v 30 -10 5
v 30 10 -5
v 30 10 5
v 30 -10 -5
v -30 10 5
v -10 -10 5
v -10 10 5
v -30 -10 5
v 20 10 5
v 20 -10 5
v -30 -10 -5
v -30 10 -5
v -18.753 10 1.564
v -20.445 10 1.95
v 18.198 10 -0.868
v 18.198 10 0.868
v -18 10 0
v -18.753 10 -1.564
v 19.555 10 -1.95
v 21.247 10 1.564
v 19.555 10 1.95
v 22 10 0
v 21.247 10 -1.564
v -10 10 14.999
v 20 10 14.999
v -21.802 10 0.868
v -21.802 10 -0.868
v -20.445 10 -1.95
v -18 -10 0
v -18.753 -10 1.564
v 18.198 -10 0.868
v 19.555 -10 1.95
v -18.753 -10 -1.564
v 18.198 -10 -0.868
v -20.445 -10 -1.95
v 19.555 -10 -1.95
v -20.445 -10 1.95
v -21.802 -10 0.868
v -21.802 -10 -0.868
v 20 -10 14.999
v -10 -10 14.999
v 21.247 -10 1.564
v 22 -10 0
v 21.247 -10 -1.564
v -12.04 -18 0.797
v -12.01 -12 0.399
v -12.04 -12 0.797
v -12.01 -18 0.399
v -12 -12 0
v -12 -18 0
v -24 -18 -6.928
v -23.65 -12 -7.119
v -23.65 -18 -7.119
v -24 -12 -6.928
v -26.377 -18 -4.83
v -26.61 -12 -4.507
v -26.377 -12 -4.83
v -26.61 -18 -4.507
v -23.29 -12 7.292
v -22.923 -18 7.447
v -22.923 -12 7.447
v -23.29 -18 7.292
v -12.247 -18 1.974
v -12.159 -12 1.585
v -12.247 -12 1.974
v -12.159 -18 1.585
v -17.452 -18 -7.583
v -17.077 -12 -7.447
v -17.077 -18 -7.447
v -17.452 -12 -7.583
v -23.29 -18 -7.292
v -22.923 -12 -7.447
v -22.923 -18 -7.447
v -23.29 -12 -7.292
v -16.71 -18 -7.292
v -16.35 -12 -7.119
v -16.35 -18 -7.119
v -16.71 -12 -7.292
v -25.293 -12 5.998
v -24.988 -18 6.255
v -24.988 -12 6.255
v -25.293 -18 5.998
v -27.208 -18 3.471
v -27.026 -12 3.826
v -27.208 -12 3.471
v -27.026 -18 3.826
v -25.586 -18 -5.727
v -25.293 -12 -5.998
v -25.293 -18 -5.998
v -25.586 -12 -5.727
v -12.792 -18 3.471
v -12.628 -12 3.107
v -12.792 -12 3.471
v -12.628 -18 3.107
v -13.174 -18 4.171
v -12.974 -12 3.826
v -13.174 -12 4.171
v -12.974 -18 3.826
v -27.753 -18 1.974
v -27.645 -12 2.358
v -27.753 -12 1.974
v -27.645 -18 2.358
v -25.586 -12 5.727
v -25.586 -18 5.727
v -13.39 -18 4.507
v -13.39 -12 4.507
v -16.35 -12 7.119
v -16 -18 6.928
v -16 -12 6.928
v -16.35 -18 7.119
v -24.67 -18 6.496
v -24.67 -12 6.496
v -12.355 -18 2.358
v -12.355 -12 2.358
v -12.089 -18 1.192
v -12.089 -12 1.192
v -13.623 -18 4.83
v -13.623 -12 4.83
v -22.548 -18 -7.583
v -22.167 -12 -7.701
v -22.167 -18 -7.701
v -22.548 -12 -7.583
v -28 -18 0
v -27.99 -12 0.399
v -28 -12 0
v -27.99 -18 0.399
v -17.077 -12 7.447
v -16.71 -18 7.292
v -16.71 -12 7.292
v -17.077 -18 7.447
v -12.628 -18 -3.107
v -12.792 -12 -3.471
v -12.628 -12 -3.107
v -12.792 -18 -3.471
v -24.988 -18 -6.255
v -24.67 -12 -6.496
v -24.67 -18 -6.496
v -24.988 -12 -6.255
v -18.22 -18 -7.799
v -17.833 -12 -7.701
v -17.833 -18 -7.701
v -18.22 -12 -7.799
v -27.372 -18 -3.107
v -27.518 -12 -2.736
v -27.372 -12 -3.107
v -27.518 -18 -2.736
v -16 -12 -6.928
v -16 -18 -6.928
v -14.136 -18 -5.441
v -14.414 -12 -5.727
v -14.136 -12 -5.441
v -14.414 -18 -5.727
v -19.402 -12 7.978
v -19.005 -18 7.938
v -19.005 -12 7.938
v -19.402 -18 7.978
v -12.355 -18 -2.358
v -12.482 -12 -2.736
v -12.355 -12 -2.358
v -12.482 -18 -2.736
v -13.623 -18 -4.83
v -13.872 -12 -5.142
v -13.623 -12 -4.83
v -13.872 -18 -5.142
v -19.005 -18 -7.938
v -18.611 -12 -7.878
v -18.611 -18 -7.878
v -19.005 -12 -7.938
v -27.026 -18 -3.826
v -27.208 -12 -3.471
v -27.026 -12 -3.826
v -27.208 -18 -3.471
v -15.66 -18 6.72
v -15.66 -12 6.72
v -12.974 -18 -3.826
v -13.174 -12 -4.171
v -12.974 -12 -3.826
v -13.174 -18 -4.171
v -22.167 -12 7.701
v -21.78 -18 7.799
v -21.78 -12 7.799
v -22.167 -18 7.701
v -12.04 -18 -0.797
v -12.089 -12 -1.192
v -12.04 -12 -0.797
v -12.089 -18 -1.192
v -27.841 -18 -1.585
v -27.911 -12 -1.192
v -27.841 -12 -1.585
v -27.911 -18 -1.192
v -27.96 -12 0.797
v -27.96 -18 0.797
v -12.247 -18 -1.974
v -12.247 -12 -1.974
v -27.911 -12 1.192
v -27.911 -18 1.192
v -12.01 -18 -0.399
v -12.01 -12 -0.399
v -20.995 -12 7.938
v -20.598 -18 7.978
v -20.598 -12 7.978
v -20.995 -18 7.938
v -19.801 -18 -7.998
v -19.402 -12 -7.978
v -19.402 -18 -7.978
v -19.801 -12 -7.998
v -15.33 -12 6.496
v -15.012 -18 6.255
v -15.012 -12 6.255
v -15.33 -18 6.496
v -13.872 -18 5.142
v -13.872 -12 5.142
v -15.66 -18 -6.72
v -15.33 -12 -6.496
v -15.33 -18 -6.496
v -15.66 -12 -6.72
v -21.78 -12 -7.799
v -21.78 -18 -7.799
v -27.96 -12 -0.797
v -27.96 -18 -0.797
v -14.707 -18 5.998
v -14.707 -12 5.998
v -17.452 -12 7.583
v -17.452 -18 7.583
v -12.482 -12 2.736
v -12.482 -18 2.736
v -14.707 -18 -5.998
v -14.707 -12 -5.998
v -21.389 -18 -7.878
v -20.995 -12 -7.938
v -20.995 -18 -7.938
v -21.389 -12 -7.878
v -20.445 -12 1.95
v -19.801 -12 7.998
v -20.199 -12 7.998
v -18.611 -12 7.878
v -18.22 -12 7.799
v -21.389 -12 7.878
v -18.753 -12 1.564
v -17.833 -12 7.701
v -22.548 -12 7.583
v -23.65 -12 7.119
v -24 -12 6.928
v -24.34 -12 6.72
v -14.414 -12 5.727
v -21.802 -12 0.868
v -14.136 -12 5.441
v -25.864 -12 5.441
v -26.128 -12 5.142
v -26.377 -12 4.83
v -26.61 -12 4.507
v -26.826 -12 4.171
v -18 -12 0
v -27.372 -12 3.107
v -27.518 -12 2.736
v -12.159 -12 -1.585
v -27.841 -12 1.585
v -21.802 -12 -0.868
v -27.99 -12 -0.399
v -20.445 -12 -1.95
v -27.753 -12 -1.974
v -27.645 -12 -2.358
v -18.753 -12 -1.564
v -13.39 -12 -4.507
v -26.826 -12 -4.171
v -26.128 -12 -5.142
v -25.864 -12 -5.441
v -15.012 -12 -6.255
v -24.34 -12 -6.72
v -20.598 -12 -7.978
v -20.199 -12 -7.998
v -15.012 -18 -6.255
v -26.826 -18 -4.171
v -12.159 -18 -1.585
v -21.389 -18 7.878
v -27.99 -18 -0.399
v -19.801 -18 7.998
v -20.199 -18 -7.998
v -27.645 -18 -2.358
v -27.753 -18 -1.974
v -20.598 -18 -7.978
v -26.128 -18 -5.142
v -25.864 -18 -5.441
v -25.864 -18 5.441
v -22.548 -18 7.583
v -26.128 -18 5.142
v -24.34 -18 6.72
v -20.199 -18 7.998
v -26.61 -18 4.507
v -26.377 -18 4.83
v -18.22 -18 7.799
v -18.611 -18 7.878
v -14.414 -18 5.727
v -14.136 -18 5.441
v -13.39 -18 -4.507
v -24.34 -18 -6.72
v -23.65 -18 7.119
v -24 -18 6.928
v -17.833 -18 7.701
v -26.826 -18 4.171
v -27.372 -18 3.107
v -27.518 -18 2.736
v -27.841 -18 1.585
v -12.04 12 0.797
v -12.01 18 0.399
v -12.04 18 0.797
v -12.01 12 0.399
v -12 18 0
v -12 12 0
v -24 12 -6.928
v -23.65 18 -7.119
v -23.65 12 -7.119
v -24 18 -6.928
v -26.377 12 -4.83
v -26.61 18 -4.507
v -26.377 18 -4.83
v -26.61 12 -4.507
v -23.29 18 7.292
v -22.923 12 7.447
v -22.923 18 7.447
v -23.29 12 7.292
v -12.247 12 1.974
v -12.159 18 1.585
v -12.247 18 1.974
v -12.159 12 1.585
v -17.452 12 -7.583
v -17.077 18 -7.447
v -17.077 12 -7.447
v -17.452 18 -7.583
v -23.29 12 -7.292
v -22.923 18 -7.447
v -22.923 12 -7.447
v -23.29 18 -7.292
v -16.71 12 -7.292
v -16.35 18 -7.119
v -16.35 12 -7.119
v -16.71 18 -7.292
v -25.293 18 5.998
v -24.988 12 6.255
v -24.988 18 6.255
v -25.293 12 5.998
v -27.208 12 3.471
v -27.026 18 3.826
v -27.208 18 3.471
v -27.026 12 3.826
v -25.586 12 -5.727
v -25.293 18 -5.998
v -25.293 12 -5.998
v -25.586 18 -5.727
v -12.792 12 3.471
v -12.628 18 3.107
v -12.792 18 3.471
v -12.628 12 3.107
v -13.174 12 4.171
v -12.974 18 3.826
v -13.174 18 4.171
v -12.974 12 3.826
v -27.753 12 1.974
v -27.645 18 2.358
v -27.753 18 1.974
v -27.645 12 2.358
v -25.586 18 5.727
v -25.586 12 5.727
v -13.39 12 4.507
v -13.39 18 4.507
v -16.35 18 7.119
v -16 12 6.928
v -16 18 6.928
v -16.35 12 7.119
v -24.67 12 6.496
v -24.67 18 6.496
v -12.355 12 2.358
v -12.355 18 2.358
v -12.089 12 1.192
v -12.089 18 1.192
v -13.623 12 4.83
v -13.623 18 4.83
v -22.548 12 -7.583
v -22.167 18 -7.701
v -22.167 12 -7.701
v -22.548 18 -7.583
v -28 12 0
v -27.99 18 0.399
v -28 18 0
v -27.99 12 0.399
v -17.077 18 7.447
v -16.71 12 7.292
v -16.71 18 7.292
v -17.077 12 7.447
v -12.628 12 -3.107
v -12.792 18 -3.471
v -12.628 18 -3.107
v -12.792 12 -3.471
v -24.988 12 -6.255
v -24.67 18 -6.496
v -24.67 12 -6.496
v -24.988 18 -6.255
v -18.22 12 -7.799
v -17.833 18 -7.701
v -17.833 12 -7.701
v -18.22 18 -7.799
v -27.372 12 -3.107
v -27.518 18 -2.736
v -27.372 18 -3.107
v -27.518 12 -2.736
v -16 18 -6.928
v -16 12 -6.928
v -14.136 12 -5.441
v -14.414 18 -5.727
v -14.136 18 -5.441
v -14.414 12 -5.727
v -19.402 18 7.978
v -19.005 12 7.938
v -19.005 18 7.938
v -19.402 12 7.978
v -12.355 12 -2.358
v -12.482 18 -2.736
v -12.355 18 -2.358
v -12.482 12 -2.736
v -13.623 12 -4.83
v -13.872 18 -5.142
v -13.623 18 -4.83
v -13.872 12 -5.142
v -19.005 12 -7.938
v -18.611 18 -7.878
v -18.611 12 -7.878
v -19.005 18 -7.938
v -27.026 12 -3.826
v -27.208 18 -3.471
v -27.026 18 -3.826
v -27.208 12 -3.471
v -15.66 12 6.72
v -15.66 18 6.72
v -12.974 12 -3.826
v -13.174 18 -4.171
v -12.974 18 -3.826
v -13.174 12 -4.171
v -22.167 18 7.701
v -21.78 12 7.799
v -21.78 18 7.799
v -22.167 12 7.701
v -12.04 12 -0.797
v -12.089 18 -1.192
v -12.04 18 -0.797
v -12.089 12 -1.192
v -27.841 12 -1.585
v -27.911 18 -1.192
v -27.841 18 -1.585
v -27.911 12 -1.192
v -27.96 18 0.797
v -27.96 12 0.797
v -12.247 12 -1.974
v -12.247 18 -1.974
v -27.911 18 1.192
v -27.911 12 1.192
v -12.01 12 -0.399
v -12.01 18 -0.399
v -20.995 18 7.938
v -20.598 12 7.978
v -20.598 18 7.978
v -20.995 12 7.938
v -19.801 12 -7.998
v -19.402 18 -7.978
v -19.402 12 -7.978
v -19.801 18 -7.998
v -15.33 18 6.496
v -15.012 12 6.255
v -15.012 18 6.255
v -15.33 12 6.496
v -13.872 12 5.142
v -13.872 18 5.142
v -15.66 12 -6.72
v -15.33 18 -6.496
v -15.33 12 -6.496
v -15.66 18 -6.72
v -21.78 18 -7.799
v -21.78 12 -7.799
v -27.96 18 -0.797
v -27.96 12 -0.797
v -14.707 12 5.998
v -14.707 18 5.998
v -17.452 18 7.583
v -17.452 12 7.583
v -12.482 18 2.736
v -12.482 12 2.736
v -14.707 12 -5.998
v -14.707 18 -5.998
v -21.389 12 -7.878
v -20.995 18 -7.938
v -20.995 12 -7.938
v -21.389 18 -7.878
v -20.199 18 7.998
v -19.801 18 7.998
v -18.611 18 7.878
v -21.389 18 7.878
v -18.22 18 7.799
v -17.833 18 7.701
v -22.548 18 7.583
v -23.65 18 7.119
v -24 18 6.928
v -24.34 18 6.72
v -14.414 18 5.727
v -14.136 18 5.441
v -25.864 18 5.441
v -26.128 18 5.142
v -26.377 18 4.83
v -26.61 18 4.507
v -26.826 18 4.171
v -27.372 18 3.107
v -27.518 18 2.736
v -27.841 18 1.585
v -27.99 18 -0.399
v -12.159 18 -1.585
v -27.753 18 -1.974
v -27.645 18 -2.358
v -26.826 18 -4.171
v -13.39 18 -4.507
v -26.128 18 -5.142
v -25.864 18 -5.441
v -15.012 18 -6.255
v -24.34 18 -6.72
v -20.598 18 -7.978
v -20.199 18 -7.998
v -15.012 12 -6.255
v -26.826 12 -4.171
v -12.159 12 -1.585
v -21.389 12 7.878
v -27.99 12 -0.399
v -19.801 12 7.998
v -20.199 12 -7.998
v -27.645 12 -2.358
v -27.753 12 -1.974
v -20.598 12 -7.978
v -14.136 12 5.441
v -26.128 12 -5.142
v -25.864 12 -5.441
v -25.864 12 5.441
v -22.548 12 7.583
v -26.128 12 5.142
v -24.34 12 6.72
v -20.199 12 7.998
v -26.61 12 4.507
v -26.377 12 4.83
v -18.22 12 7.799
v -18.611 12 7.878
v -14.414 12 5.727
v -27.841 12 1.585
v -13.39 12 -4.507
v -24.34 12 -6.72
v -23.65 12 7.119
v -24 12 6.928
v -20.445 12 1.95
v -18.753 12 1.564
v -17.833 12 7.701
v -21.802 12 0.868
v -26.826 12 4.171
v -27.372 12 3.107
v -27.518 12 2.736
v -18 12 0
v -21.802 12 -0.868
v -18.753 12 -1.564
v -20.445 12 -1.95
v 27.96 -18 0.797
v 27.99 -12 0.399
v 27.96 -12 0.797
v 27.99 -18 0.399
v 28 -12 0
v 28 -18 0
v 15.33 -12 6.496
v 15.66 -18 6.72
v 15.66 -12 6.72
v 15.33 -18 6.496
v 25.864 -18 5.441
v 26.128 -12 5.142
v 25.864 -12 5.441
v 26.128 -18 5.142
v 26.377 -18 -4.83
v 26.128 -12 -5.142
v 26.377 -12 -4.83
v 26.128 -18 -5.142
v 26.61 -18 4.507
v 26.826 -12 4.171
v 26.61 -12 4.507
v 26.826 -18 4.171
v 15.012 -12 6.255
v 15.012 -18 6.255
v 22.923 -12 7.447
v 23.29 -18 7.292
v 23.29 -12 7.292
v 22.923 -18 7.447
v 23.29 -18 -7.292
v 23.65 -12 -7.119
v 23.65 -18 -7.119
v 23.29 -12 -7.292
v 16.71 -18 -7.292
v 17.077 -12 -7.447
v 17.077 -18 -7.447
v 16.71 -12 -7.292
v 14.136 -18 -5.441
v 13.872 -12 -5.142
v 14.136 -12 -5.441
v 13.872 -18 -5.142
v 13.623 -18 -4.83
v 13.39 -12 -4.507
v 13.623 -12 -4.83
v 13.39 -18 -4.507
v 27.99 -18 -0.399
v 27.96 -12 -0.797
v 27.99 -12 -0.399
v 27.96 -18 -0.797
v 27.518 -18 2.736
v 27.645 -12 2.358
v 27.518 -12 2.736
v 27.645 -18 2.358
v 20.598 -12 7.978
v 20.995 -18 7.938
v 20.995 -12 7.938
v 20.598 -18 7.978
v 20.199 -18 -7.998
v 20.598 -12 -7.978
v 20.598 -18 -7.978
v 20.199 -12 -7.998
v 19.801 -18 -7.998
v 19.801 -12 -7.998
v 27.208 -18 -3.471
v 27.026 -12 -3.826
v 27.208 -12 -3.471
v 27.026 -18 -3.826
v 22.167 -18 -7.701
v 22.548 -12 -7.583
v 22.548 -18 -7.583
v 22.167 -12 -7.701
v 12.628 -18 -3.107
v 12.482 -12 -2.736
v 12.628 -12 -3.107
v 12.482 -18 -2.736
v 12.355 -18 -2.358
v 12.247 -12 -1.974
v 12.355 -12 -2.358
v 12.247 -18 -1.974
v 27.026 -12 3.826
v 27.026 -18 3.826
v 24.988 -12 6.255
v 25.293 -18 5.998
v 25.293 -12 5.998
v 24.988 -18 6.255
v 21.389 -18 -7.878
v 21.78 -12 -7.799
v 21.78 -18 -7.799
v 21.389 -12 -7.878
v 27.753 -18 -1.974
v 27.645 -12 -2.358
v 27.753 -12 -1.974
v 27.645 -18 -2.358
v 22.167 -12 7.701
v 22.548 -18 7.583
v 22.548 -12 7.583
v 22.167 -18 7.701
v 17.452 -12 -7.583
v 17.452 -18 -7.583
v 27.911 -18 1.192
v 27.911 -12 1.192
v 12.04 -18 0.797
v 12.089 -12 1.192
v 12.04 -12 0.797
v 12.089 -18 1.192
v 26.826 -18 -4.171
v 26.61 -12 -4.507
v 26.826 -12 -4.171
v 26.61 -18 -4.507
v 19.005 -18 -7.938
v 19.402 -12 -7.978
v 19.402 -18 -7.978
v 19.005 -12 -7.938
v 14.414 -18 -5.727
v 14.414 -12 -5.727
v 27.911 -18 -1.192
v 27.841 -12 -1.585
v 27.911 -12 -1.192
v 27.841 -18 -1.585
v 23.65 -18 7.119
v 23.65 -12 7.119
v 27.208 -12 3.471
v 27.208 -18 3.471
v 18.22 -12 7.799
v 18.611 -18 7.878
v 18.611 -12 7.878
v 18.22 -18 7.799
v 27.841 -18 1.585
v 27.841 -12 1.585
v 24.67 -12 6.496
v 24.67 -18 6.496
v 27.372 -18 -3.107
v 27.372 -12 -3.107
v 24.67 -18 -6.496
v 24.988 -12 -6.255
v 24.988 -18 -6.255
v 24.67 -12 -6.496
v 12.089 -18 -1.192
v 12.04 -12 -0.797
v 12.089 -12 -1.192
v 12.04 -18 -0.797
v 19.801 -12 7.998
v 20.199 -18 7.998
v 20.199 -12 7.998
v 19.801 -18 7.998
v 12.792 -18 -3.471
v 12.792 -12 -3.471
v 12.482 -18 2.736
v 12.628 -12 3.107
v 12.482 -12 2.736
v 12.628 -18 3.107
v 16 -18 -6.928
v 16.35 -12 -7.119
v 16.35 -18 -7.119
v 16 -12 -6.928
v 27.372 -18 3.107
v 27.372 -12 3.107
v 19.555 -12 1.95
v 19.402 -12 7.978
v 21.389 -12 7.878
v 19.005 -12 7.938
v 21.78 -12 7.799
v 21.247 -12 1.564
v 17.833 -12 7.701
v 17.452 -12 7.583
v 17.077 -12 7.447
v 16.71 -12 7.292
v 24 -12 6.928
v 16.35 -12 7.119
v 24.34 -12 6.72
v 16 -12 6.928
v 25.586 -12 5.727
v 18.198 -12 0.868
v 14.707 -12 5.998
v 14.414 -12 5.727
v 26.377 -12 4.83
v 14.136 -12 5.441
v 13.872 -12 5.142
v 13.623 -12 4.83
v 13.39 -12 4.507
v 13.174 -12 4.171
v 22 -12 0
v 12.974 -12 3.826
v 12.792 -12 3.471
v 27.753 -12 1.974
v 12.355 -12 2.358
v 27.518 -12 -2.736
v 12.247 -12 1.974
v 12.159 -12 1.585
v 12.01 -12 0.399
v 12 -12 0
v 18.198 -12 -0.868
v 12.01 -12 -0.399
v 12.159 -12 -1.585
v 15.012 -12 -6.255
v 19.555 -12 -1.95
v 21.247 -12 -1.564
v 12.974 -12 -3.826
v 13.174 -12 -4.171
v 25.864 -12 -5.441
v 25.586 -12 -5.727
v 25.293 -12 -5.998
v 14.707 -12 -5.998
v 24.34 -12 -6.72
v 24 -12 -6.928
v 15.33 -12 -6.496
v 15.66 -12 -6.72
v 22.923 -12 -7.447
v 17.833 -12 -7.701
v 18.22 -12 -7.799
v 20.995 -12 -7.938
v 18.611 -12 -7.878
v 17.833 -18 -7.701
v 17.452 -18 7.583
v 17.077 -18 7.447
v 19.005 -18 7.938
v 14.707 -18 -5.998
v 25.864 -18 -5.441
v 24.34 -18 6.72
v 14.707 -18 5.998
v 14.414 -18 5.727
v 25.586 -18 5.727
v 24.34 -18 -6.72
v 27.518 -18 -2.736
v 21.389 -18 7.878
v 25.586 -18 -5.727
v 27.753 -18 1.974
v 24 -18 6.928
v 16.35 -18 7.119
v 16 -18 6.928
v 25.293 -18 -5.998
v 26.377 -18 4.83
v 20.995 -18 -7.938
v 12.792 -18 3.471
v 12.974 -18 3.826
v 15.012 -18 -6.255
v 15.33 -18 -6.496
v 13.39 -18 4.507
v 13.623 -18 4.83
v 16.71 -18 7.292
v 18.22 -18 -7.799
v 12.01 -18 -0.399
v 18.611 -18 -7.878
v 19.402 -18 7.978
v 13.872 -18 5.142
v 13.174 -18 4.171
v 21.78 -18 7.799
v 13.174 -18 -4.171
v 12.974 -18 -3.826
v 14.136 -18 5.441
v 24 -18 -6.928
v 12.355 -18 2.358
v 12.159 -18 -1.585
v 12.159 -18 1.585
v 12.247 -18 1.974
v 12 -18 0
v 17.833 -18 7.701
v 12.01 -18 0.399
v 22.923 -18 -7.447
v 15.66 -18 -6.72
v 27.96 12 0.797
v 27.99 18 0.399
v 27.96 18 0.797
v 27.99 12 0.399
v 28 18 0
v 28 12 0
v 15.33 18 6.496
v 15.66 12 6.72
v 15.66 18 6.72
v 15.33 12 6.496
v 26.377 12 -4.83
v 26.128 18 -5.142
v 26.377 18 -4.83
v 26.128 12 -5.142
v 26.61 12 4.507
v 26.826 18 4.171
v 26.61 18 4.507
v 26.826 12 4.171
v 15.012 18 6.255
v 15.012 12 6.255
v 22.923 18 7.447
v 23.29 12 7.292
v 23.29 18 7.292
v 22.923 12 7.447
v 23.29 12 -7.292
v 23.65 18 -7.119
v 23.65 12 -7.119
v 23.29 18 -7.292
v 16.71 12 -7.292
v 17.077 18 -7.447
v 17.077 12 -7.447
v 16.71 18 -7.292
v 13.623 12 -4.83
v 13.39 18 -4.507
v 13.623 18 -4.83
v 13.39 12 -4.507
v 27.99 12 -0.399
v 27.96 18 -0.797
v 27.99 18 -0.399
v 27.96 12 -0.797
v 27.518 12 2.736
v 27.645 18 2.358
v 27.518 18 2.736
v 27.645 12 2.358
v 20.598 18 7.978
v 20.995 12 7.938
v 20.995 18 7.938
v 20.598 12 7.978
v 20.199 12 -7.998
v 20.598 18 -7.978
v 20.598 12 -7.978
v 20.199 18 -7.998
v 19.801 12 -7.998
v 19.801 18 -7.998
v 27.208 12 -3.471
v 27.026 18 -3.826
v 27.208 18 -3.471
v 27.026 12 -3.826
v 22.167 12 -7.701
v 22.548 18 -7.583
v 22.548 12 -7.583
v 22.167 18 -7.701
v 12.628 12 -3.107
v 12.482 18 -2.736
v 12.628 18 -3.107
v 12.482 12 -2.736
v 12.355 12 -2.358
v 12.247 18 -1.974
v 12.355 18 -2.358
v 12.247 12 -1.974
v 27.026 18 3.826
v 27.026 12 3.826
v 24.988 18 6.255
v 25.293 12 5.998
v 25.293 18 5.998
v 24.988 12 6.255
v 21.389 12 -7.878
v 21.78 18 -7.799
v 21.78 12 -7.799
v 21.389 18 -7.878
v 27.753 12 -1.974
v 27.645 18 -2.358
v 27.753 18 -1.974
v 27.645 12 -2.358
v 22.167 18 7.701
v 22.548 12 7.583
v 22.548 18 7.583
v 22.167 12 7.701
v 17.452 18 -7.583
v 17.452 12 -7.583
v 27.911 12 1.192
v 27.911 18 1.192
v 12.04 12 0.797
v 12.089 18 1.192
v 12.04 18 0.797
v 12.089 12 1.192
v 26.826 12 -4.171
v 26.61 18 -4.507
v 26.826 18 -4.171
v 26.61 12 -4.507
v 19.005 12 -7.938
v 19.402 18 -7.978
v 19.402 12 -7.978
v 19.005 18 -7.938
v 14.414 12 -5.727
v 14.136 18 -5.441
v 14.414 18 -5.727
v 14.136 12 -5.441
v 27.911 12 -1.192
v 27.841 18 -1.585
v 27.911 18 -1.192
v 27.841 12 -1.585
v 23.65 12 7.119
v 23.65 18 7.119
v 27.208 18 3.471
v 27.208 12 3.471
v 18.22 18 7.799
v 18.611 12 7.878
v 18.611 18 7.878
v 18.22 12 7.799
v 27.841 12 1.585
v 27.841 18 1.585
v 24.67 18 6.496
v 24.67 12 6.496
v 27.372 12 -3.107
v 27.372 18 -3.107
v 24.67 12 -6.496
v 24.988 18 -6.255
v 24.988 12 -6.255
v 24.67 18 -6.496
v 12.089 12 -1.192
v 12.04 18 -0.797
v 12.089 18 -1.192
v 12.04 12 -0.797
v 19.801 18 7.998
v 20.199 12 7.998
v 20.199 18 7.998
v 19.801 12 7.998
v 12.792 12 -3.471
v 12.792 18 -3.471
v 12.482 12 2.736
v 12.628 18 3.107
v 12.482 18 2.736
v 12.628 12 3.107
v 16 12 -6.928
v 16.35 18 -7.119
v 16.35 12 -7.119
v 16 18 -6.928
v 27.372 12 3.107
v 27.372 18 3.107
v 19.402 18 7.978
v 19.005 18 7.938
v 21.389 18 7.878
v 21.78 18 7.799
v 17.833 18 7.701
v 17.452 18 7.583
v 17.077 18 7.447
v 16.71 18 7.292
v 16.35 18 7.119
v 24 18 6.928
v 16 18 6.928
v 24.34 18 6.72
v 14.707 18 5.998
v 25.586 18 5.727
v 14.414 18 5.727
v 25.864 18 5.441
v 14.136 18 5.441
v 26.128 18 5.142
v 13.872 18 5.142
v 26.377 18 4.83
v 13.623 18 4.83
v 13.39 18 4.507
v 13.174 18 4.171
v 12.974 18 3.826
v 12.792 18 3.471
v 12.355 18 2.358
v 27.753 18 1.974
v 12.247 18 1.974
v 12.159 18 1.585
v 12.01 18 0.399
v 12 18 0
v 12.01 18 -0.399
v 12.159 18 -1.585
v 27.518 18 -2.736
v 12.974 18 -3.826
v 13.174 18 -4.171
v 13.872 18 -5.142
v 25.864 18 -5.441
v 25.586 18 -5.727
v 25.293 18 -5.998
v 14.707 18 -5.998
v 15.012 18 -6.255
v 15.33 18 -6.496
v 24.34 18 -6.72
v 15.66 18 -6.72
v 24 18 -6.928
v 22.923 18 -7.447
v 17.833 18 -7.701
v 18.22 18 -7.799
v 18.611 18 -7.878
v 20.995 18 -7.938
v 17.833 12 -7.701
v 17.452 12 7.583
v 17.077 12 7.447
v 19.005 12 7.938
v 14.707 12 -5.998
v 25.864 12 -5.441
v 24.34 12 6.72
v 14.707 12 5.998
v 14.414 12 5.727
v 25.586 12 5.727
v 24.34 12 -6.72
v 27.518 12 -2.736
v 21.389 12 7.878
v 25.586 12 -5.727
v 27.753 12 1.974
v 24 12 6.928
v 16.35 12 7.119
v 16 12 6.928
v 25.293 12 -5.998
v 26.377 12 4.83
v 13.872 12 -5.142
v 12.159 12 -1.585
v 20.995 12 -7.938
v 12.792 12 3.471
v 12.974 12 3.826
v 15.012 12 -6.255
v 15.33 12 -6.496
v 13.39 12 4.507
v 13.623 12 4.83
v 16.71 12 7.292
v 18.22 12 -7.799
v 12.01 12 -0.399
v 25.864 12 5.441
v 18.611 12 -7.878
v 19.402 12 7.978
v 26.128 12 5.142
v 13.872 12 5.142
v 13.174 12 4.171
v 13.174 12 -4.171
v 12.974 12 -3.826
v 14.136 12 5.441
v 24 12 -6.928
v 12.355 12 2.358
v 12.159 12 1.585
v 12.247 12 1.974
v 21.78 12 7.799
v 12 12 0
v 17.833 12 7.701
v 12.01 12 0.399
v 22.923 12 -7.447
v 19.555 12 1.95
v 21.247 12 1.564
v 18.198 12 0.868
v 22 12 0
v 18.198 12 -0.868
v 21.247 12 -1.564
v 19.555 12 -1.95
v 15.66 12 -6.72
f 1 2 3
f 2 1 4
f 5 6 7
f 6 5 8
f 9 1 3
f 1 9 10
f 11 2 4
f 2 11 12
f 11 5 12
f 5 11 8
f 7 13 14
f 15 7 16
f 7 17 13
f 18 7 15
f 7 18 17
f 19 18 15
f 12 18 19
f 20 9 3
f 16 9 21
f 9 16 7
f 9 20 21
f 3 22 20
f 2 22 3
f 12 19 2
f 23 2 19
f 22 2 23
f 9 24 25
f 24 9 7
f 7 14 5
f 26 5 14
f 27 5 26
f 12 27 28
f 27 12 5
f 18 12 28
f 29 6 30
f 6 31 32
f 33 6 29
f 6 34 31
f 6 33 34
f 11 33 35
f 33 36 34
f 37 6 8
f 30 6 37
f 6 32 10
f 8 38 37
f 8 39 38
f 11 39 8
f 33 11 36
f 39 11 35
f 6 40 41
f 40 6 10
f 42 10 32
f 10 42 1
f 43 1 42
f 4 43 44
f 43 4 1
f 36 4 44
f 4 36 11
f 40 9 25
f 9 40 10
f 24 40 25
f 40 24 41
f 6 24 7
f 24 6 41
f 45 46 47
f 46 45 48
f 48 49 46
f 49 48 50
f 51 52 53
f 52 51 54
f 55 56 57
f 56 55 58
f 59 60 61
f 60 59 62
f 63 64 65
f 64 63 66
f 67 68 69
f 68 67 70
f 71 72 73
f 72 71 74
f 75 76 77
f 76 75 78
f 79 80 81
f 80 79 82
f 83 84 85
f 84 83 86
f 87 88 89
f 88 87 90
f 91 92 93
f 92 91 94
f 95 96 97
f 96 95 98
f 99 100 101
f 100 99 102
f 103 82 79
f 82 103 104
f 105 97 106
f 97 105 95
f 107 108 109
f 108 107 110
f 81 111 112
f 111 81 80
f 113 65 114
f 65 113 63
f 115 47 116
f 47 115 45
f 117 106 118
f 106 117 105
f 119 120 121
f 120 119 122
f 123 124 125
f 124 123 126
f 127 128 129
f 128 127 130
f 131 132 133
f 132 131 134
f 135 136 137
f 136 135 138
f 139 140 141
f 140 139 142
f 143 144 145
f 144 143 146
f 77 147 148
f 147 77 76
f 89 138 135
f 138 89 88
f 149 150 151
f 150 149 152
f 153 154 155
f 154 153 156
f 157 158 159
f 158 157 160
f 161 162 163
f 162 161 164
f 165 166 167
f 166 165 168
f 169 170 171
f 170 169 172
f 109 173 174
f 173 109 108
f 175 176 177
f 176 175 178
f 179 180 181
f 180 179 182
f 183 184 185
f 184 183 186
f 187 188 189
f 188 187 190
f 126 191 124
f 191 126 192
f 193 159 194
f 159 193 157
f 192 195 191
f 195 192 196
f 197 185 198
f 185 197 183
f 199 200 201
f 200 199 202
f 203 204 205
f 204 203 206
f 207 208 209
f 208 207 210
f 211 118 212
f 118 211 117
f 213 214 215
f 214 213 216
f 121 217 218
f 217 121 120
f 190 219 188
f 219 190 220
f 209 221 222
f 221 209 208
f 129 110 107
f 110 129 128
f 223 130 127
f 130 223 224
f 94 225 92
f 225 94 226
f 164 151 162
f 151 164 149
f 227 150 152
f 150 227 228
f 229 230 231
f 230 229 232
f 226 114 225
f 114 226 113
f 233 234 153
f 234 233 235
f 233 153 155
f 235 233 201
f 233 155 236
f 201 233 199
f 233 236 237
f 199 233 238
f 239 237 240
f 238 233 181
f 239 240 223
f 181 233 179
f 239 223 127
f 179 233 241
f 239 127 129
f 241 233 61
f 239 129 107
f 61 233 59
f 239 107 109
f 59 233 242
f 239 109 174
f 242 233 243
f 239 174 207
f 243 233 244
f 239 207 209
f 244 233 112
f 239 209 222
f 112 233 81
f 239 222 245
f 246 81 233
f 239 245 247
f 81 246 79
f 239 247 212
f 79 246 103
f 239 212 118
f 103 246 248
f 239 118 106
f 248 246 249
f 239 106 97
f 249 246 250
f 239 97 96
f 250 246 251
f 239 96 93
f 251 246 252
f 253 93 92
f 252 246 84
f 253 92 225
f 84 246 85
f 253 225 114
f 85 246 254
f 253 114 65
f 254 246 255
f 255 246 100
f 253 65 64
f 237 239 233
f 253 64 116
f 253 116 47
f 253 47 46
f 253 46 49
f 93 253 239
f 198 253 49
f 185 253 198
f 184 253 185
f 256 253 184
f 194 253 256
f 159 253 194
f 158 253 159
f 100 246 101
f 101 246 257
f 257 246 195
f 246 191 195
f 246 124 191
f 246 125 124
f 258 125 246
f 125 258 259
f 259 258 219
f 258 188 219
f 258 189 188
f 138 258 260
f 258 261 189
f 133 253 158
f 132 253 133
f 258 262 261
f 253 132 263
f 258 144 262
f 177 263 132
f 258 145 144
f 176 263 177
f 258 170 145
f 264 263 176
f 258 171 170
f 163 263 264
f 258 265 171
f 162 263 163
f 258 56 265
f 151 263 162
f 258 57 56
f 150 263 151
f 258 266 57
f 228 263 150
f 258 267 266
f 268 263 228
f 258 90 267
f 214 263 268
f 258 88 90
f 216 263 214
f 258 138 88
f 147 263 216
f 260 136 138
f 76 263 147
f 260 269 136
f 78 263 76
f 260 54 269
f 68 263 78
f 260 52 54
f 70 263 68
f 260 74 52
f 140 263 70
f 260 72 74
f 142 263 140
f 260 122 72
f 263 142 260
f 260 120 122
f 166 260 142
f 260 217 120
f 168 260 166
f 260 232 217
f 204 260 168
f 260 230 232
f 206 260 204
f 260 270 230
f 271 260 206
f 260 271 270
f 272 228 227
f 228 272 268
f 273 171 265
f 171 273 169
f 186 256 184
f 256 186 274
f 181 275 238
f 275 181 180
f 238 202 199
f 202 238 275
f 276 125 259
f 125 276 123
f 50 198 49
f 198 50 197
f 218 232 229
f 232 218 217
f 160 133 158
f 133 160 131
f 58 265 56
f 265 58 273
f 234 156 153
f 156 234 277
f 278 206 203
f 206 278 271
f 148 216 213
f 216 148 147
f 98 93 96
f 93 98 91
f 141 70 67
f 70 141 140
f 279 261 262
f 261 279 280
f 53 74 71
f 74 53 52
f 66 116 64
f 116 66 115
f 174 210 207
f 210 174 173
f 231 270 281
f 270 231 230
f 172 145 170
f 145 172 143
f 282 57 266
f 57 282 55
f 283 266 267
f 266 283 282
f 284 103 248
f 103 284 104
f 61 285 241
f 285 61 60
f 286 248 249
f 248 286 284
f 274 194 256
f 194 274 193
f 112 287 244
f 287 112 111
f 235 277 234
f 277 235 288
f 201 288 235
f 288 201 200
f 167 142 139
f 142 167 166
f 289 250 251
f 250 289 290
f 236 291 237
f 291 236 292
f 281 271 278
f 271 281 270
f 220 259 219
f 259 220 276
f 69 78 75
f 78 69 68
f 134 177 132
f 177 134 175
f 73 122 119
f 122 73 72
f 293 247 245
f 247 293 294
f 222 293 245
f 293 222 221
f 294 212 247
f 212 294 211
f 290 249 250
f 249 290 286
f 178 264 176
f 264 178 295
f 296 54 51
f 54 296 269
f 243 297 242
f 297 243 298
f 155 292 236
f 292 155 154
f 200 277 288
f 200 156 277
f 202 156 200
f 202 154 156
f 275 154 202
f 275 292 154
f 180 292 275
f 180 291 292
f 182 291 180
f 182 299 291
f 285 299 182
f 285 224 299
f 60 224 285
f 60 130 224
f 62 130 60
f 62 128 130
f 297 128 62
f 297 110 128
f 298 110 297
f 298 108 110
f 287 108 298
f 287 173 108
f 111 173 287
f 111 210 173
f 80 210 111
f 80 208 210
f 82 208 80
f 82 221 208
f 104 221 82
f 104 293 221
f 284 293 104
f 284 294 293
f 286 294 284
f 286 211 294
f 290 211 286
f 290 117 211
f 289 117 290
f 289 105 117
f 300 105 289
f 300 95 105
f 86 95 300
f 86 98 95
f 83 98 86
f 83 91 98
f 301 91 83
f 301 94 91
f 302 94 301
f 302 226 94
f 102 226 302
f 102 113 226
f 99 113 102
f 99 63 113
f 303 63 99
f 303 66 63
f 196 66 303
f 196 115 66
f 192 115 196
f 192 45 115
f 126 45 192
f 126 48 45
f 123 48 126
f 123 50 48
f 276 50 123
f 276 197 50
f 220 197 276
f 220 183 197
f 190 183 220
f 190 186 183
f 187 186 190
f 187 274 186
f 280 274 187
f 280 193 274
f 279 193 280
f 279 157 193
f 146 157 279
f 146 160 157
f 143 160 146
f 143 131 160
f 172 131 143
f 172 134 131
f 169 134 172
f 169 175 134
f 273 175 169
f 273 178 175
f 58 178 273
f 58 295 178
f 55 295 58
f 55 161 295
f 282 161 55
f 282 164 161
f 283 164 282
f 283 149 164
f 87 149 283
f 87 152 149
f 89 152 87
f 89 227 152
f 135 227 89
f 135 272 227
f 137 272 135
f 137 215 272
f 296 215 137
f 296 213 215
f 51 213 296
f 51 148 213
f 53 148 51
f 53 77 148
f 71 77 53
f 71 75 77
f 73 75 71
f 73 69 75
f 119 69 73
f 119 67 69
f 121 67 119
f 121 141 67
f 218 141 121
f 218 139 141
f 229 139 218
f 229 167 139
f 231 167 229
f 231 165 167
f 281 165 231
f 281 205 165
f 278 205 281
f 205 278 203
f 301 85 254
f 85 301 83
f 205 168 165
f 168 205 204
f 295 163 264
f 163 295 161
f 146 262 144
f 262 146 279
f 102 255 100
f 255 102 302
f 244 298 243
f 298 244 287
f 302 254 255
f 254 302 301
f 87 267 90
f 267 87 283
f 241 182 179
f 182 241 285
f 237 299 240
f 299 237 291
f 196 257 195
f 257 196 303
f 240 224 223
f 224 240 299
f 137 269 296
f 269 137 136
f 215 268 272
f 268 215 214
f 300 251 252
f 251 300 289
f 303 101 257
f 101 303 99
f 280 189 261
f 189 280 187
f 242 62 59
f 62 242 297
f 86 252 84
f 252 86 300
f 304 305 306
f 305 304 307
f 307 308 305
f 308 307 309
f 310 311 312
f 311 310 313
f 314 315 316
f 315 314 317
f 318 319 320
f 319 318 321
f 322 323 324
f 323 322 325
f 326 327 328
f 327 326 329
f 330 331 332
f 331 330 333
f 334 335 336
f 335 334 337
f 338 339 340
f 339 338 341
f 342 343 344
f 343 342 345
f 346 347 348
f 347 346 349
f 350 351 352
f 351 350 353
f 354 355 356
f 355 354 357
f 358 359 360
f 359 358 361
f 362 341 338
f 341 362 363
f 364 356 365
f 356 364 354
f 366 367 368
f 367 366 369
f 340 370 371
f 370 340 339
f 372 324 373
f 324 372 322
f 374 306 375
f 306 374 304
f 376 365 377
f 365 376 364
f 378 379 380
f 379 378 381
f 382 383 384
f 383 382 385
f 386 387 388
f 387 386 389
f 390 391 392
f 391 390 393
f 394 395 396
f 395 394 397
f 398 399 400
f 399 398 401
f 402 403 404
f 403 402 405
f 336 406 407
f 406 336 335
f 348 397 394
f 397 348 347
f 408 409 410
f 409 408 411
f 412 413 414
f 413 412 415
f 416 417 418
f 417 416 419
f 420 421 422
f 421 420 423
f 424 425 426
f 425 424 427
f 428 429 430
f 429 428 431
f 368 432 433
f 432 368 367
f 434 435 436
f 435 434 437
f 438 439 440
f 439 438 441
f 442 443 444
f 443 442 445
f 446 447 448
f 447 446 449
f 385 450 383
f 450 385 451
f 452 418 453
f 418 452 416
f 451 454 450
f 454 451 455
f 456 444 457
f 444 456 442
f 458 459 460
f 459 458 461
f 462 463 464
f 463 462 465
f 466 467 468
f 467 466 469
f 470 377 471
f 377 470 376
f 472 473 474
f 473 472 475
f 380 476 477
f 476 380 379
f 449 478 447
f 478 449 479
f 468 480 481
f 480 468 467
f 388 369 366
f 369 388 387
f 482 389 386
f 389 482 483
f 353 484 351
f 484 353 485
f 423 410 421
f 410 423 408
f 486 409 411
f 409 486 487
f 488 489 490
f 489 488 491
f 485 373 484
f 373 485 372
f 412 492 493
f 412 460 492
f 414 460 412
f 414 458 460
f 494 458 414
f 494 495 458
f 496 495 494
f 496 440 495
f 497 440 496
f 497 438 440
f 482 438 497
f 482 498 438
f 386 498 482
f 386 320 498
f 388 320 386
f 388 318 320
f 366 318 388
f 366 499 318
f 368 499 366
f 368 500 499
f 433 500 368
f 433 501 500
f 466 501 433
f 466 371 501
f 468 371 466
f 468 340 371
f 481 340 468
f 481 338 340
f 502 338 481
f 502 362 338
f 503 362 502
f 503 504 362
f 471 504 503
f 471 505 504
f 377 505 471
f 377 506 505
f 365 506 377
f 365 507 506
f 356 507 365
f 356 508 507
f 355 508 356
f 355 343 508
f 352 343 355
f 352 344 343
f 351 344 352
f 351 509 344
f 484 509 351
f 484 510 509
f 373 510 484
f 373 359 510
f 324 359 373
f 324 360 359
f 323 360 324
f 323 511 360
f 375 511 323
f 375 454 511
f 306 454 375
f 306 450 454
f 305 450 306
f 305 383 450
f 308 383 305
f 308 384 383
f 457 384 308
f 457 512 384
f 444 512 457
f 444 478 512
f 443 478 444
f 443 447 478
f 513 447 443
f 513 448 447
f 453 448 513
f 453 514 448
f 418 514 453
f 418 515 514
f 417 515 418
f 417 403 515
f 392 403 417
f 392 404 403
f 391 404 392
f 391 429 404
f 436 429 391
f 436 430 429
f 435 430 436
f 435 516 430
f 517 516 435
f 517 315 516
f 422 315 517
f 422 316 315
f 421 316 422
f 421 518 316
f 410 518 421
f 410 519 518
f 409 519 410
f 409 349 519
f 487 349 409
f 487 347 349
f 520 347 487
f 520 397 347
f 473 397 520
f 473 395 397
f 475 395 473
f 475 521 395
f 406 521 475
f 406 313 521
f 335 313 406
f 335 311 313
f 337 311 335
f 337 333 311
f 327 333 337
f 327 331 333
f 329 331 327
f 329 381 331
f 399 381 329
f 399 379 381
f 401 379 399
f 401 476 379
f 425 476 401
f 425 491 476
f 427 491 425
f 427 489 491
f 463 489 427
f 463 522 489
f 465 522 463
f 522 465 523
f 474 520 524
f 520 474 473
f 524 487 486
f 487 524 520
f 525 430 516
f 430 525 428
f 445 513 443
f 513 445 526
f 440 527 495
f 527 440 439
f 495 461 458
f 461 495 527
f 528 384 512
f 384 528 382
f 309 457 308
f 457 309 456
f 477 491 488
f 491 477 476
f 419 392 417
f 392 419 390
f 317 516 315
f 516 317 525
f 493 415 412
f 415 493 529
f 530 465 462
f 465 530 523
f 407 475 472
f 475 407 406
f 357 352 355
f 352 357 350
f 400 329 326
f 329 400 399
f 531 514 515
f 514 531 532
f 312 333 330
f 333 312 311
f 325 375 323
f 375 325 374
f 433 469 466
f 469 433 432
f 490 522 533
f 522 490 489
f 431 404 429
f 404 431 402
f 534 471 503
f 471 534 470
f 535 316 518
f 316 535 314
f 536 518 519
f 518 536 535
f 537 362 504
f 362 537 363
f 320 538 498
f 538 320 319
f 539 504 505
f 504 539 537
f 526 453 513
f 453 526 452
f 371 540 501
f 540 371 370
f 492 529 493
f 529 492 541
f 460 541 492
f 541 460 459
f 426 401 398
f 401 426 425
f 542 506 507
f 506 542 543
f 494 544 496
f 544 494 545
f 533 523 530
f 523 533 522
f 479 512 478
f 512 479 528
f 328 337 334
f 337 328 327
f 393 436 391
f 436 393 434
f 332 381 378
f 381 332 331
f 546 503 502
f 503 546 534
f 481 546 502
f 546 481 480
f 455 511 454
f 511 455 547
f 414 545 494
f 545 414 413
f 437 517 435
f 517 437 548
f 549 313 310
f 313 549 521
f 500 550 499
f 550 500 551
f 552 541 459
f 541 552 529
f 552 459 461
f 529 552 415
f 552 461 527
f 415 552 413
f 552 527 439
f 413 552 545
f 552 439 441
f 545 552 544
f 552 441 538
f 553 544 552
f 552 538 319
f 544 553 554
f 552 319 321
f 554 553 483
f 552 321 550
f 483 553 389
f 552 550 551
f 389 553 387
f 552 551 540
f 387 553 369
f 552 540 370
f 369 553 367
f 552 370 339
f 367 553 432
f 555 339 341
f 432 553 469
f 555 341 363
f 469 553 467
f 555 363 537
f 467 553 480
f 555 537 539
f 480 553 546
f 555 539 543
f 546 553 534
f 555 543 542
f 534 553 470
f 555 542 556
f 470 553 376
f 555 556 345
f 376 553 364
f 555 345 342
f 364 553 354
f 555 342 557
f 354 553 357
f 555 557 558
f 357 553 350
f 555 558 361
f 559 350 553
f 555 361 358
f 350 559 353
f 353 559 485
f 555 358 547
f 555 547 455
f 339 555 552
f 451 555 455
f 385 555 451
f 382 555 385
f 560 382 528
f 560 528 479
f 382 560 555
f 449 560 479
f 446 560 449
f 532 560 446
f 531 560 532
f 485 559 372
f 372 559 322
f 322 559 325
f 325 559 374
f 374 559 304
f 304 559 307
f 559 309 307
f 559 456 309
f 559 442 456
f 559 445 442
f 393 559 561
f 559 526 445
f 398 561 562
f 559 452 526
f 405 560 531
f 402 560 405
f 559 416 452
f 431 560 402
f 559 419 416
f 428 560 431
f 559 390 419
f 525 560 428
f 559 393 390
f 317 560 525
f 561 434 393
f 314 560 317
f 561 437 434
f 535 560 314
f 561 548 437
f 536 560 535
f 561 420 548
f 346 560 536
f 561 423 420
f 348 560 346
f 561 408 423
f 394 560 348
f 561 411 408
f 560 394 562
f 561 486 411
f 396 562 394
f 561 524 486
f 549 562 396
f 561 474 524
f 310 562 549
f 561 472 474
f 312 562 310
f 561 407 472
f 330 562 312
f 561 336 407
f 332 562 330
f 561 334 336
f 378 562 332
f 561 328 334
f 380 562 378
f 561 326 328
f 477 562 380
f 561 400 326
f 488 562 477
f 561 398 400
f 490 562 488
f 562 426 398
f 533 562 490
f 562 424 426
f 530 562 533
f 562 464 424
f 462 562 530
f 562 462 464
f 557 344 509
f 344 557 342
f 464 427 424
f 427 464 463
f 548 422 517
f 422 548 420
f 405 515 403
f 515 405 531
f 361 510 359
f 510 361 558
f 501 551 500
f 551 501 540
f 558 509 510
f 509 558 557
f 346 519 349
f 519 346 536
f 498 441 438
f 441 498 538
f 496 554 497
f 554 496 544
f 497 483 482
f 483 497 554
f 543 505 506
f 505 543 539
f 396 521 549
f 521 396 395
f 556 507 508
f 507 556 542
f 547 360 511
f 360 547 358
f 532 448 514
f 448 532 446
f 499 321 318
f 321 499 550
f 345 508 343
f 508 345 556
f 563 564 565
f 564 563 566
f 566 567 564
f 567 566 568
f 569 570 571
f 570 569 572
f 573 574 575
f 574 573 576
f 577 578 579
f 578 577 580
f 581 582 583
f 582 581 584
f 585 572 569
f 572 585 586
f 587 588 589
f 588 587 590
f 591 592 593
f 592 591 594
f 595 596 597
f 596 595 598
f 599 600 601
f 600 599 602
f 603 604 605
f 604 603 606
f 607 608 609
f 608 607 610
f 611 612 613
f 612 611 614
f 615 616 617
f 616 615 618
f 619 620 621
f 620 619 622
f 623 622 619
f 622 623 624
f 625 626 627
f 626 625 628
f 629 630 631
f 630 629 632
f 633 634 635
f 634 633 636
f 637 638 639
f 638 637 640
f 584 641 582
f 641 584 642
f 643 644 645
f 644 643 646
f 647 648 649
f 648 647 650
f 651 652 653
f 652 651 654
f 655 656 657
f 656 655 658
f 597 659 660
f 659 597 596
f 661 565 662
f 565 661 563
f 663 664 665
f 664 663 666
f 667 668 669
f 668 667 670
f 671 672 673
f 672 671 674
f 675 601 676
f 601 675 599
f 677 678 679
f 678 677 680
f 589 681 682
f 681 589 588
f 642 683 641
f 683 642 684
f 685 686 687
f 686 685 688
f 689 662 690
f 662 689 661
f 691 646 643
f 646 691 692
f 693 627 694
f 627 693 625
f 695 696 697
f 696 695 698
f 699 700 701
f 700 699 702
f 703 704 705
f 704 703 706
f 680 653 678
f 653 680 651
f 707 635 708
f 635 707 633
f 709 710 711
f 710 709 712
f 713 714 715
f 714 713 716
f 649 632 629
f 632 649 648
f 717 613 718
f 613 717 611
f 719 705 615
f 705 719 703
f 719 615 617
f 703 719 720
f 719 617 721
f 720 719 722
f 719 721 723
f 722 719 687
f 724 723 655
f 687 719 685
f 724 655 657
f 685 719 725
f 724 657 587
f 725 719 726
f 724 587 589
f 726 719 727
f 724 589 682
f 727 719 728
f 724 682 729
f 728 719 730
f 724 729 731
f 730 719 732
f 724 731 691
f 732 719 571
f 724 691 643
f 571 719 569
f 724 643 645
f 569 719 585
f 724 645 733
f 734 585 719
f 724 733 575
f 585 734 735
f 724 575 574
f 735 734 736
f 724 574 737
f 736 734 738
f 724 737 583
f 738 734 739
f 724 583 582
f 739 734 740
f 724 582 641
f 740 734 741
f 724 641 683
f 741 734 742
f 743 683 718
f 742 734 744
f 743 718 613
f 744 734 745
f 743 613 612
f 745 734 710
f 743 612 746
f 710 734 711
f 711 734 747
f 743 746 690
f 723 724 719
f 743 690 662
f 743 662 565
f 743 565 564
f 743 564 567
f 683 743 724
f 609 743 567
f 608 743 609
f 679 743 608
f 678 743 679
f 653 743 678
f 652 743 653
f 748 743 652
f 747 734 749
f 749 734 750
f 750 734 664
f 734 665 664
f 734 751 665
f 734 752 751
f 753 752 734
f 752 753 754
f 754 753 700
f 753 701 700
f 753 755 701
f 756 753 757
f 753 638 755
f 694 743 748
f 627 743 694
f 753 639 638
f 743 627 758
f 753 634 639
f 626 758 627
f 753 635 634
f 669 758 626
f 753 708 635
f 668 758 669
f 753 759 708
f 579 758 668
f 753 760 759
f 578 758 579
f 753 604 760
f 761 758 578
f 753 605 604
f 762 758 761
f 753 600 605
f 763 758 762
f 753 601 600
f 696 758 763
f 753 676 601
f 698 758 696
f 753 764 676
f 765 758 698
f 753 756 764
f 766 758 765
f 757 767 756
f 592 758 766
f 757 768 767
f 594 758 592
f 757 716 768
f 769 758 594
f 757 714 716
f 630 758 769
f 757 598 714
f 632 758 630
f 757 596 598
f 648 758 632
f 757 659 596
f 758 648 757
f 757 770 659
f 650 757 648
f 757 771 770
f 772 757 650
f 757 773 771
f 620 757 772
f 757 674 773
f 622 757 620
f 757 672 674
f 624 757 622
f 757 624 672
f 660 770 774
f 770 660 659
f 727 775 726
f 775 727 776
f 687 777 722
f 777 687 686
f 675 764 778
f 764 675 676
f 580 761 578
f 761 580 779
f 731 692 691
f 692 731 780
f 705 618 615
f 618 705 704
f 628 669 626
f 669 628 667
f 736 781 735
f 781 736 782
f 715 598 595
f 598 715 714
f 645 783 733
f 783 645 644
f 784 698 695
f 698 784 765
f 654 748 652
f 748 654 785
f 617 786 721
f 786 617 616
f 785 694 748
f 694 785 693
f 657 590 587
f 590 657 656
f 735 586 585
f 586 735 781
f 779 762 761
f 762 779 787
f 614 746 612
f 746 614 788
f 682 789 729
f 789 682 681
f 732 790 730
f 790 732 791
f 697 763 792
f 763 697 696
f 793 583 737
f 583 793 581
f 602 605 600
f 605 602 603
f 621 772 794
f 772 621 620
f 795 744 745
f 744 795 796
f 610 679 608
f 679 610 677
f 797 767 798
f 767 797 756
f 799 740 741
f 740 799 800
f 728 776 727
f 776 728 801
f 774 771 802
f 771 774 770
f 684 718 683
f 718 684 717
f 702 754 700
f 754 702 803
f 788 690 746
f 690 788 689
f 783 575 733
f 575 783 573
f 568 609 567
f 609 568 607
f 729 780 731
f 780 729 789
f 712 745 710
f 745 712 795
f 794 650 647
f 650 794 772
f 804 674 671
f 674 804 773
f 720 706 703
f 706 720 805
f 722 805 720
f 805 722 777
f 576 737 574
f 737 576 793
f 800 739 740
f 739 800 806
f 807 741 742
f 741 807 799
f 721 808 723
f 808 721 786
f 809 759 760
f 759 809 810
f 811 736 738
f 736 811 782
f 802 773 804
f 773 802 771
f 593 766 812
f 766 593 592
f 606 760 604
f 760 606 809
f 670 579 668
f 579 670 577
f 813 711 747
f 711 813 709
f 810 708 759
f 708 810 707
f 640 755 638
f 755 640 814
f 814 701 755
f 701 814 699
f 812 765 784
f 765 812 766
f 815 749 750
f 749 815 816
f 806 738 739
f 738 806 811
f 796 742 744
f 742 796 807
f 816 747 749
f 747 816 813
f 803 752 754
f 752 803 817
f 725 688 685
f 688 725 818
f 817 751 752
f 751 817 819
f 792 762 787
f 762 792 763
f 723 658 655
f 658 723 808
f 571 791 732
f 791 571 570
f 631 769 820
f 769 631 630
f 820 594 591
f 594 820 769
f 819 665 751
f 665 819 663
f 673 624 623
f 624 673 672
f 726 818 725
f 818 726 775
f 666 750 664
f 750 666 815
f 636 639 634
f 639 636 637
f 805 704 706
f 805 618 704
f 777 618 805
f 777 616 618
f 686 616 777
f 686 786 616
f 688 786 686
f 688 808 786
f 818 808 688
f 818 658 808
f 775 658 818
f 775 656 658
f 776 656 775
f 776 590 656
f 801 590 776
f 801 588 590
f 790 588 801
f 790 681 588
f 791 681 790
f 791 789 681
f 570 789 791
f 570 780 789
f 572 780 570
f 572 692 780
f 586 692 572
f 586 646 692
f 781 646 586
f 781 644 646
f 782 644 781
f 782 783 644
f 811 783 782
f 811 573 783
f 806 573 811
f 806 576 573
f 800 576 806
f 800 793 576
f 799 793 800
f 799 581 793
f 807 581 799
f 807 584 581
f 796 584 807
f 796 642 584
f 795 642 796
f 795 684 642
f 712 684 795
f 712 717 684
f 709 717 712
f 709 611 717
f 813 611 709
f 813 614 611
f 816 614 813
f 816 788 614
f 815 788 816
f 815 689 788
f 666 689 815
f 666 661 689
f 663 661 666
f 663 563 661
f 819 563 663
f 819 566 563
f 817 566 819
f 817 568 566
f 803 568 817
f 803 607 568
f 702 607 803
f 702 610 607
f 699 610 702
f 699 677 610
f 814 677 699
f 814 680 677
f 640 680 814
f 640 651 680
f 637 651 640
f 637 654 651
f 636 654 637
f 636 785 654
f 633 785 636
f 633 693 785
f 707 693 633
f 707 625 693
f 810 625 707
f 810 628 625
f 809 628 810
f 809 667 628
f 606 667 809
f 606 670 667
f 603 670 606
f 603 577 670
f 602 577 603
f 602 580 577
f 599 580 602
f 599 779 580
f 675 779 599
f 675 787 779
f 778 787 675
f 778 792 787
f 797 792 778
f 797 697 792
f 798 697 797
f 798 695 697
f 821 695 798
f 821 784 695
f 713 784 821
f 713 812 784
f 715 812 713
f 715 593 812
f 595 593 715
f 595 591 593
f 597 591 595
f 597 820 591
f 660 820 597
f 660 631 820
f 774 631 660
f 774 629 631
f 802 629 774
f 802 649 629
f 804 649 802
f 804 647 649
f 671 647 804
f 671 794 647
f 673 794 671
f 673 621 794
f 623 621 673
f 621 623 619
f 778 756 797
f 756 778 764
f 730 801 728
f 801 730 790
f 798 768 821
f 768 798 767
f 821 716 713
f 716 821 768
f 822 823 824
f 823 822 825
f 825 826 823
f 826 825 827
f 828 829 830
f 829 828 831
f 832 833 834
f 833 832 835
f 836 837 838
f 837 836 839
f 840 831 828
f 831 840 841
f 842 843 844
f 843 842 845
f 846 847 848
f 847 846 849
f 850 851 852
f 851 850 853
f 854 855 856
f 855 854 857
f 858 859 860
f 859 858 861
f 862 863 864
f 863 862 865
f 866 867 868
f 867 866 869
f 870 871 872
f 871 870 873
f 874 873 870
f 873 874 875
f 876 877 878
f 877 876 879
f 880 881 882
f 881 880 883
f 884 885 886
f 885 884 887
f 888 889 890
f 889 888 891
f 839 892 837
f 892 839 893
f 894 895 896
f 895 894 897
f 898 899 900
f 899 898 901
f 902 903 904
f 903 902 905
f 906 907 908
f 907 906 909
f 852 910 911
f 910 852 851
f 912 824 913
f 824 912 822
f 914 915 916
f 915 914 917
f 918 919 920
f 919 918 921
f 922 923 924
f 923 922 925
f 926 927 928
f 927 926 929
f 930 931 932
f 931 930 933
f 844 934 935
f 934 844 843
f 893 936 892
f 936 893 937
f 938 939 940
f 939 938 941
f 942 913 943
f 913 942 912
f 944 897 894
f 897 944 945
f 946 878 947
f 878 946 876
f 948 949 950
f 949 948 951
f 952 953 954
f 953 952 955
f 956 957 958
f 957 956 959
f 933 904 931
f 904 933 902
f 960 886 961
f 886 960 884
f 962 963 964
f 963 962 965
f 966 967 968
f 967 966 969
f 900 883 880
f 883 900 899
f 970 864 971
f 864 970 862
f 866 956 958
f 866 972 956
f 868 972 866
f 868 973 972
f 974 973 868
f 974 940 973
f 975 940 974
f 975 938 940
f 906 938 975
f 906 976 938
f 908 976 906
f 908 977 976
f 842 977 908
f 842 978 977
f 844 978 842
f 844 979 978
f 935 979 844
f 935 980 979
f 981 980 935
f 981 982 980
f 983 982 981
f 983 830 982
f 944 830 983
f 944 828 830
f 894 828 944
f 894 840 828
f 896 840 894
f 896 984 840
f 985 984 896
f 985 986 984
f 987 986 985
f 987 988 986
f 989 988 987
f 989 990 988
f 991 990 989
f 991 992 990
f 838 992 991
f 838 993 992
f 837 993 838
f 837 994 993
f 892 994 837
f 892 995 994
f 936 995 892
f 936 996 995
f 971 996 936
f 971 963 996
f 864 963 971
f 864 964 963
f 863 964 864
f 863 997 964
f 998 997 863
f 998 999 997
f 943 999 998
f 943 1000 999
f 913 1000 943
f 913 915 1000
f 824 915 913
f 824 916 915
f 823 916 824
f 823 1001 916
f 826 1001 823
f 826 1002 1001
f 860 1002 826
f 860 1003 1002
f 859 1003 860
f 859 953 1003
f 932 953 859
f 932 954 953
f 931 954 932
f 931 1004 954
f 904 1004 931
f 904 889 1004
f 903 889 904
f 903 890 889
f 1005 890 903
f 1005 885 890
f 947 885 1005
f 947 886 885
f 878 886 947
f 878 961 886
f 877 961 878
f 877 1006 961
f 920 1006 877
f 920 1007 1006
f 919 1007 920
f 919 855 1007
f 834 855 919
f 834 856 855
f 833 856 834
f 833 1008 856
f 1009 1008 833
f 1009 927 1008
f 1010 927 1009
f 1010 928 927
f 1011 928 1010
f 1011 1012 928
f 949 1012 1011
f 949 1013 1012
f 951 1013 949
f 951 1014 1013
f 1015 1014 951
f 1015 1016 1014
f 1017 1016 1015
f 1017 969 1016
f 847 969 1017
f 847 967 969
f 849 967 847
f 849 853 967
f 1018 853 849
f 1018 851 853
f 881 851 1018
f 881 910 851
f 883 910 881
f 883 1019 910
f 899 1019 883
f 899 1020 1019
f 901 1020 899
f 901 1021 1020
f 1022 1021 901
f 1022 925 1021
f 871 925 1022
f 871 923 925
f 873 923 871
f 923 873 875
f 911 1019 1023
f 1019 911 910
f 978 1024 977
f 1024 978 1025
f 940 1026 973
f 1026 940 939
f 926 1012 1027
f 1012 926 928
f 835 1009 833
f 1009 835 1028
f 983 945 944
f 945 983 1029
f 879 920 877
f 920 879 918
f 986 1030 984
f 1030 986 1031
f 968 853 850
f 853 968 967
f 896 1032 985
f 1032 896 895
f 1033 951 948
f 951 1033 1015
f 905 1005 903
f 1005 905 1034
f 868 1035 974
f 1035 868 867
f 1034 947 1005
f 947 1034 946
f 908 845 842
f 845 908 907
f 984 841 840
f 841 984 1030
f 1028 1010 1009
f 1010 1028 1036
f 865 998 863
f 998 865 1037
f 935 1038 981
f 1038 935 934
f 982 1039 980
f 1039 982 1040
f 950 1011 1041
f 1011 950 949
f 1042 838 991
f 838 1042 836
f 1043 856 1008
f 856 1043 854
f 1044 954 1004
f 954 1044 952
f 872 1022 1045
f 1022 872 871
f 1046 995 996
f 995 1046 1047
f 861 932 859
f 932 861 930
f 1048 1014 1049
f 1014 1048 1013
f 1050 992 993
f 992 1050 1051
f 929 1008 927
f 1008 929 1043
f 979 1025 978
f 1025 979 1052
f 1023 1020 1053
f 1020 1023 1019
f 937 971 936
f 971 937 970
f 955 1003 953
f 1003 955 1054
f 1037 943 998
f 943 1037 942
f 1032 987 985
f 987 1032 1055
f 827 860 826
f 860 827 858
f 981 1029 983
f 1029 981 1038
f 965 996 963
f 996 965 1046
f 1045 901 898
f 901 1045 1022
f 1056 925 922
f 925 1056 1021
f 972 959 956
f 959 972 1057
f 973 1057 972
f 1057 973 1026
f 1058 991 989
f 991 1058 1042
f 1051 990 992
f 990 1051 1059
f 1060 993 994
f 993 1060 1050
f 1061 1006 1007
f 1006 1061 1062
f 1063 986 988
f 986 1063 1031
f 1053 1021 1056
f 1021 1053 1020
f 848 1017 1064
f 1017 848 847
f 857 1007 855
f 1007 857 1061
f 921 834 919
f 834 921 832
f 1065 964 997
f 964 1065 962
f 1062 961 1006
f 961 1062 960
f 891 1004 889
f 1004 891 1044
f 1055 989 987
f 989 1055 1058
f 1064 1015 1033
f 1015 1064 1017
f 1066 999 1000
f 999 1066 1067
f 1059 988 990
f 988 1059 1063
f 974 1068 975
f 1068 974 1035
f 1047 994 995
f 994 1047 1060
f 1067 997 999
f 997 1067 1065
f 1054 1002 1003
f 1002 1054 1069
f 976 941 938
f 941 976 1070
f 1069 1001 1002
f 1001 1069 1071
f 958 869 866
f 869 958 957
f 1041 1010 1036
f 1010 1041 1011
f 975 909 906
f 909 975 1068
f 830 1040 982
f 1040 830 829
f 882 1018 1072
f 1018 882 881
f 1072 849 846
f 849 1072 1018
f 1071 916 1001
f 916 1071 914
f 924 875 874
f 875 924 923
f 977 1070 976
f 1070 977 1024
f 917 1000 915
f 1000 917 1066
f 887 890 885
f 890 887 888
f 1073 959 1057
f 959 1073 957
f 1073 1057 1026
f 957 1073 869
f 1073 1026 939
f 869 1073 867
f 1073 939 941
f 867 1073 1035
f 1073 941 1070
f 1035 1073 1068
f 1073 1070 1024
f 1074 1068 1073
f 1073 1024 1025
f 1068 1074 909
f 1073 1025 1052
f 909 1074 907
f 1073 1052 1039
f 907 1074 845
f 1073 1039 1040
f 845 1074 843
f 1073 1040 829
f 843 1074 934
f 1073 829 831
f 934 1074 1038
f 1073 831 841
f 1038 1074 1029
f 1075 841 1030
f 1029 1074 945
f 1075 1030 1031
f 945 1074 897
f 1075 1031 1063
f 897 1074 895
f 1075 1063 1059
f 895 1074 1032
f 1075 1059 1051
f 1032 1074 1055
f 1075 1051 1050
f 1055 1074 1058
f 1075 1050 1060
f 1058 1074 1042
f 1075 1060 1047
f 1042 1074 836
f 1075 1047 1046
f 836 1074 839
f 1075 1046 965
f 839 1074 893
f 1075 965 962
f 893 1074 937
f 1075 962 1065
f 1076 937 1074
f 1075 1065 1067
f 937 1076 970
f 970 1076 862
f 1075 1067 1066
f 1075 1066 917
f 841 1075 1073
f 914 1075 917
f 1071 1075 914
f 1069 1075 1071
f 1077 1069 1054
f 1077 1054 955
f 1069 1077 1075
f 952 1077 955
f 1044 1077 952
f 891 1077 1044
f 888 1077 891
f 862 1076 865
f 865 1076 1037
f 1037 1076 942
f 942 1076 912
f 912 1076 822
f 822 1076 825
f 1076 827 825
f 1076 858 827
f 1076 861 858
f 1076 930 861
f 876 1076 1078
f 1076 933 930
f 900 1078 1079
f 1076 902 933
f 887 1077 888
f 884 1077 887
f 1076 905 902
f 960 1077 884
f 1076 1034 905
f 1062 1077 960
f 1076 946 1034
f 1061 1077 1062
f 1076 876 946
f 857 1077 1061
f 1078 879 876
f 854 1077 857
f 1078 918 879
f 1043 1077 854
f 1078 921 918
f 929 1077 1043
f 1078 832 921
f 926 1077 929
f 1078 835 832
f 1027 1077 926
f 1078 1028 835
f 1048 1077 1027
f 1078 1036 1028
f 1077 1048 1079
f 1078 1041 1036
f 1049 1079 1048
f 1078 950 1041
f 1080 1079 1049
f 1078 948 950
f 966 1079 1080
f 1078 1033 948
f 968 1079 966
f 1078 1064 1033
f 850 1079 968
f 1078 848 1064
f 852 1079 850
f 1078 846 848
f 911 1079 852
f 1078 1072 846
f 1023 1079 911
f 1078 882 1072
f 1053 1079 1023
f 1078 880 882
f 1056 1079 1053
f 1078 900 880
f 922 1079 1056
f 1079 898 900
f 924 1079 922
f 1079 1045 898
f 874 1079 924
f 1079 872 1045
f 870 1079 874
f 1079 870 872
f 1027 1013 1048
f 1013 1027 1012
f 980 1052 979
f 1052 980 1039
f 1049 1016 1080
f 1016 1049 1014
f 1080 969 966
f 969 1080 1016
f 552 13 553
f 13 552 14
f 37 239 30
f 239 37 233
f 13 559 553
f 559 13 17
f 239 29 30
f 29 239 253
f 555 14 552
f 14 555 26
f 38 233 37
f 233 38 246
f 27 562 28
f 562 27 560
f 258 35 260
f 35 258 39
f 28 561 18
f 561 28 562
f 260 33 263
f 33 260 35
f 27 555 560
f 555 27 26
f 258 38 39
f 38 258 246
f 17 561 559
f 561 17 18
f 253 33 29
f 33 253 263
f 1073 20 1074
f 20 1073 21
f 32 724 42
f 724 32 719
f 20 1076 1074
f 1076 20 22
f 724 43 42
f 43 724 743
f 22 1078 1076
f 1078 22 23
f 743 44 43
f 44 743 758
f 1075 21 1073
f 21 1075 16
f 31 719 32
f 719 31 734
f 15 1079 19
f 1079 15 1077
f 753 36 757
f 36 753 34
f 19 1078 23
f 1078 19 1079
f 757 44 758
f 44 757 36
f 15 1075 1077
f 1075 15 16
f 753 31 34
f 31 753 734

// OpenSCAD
// file: chapter5-part1-simple_wheel.scad
$fa=1;
$fs=0.4;
module simple_wheel(wheel_radius=10, wheel_width=6) {
    rotate([90,0,0])
        cylinder(h=wheel_width,r=wheel_radius,center=true);
    }
simple_wheel();
// main file
use <chapter5-part1-simple_wheel.scad>

wheel_radius = 8;
wheel_width=6;
base_height = 10;
top_height = 10;
track = 30;

// Car body base
cube([60,20,base_height],center=true);

// Car body top
translate([5,0,base_height/2+top_height/2-0.001])
    cube([30,20,top_height],center=true);
    
// Front left wheel
translate([-20,-track/2,0])
    simple_wheel(wheel_radius=wheel_radius, wheel_width=wheel_width);

// Front right wheel
translate([-20,track/2,0])
    simple_wheel(wheel_radius=wheel_radius, wheel_width=wheel_width);
        
// Rear left wheel
translate([20,-track/2,0])
    simple_wheel(wheel_radius=wheel_radius, wheel_width=wheel_width);

// Rear right wheel
translate([20,track/2,0])
    simple_wheel(wheel_radius=wheel_radius, wheel_width=wheel_width);

// Front axle
translate([-20,0,0])
    rotate([90,0,0])
        cylinder(h=track,r=2,center=true);

// Rear axle
translate([20,0,0])
    rotate([90,0,0])
        cylinder(h=track,r=2,center=true);
